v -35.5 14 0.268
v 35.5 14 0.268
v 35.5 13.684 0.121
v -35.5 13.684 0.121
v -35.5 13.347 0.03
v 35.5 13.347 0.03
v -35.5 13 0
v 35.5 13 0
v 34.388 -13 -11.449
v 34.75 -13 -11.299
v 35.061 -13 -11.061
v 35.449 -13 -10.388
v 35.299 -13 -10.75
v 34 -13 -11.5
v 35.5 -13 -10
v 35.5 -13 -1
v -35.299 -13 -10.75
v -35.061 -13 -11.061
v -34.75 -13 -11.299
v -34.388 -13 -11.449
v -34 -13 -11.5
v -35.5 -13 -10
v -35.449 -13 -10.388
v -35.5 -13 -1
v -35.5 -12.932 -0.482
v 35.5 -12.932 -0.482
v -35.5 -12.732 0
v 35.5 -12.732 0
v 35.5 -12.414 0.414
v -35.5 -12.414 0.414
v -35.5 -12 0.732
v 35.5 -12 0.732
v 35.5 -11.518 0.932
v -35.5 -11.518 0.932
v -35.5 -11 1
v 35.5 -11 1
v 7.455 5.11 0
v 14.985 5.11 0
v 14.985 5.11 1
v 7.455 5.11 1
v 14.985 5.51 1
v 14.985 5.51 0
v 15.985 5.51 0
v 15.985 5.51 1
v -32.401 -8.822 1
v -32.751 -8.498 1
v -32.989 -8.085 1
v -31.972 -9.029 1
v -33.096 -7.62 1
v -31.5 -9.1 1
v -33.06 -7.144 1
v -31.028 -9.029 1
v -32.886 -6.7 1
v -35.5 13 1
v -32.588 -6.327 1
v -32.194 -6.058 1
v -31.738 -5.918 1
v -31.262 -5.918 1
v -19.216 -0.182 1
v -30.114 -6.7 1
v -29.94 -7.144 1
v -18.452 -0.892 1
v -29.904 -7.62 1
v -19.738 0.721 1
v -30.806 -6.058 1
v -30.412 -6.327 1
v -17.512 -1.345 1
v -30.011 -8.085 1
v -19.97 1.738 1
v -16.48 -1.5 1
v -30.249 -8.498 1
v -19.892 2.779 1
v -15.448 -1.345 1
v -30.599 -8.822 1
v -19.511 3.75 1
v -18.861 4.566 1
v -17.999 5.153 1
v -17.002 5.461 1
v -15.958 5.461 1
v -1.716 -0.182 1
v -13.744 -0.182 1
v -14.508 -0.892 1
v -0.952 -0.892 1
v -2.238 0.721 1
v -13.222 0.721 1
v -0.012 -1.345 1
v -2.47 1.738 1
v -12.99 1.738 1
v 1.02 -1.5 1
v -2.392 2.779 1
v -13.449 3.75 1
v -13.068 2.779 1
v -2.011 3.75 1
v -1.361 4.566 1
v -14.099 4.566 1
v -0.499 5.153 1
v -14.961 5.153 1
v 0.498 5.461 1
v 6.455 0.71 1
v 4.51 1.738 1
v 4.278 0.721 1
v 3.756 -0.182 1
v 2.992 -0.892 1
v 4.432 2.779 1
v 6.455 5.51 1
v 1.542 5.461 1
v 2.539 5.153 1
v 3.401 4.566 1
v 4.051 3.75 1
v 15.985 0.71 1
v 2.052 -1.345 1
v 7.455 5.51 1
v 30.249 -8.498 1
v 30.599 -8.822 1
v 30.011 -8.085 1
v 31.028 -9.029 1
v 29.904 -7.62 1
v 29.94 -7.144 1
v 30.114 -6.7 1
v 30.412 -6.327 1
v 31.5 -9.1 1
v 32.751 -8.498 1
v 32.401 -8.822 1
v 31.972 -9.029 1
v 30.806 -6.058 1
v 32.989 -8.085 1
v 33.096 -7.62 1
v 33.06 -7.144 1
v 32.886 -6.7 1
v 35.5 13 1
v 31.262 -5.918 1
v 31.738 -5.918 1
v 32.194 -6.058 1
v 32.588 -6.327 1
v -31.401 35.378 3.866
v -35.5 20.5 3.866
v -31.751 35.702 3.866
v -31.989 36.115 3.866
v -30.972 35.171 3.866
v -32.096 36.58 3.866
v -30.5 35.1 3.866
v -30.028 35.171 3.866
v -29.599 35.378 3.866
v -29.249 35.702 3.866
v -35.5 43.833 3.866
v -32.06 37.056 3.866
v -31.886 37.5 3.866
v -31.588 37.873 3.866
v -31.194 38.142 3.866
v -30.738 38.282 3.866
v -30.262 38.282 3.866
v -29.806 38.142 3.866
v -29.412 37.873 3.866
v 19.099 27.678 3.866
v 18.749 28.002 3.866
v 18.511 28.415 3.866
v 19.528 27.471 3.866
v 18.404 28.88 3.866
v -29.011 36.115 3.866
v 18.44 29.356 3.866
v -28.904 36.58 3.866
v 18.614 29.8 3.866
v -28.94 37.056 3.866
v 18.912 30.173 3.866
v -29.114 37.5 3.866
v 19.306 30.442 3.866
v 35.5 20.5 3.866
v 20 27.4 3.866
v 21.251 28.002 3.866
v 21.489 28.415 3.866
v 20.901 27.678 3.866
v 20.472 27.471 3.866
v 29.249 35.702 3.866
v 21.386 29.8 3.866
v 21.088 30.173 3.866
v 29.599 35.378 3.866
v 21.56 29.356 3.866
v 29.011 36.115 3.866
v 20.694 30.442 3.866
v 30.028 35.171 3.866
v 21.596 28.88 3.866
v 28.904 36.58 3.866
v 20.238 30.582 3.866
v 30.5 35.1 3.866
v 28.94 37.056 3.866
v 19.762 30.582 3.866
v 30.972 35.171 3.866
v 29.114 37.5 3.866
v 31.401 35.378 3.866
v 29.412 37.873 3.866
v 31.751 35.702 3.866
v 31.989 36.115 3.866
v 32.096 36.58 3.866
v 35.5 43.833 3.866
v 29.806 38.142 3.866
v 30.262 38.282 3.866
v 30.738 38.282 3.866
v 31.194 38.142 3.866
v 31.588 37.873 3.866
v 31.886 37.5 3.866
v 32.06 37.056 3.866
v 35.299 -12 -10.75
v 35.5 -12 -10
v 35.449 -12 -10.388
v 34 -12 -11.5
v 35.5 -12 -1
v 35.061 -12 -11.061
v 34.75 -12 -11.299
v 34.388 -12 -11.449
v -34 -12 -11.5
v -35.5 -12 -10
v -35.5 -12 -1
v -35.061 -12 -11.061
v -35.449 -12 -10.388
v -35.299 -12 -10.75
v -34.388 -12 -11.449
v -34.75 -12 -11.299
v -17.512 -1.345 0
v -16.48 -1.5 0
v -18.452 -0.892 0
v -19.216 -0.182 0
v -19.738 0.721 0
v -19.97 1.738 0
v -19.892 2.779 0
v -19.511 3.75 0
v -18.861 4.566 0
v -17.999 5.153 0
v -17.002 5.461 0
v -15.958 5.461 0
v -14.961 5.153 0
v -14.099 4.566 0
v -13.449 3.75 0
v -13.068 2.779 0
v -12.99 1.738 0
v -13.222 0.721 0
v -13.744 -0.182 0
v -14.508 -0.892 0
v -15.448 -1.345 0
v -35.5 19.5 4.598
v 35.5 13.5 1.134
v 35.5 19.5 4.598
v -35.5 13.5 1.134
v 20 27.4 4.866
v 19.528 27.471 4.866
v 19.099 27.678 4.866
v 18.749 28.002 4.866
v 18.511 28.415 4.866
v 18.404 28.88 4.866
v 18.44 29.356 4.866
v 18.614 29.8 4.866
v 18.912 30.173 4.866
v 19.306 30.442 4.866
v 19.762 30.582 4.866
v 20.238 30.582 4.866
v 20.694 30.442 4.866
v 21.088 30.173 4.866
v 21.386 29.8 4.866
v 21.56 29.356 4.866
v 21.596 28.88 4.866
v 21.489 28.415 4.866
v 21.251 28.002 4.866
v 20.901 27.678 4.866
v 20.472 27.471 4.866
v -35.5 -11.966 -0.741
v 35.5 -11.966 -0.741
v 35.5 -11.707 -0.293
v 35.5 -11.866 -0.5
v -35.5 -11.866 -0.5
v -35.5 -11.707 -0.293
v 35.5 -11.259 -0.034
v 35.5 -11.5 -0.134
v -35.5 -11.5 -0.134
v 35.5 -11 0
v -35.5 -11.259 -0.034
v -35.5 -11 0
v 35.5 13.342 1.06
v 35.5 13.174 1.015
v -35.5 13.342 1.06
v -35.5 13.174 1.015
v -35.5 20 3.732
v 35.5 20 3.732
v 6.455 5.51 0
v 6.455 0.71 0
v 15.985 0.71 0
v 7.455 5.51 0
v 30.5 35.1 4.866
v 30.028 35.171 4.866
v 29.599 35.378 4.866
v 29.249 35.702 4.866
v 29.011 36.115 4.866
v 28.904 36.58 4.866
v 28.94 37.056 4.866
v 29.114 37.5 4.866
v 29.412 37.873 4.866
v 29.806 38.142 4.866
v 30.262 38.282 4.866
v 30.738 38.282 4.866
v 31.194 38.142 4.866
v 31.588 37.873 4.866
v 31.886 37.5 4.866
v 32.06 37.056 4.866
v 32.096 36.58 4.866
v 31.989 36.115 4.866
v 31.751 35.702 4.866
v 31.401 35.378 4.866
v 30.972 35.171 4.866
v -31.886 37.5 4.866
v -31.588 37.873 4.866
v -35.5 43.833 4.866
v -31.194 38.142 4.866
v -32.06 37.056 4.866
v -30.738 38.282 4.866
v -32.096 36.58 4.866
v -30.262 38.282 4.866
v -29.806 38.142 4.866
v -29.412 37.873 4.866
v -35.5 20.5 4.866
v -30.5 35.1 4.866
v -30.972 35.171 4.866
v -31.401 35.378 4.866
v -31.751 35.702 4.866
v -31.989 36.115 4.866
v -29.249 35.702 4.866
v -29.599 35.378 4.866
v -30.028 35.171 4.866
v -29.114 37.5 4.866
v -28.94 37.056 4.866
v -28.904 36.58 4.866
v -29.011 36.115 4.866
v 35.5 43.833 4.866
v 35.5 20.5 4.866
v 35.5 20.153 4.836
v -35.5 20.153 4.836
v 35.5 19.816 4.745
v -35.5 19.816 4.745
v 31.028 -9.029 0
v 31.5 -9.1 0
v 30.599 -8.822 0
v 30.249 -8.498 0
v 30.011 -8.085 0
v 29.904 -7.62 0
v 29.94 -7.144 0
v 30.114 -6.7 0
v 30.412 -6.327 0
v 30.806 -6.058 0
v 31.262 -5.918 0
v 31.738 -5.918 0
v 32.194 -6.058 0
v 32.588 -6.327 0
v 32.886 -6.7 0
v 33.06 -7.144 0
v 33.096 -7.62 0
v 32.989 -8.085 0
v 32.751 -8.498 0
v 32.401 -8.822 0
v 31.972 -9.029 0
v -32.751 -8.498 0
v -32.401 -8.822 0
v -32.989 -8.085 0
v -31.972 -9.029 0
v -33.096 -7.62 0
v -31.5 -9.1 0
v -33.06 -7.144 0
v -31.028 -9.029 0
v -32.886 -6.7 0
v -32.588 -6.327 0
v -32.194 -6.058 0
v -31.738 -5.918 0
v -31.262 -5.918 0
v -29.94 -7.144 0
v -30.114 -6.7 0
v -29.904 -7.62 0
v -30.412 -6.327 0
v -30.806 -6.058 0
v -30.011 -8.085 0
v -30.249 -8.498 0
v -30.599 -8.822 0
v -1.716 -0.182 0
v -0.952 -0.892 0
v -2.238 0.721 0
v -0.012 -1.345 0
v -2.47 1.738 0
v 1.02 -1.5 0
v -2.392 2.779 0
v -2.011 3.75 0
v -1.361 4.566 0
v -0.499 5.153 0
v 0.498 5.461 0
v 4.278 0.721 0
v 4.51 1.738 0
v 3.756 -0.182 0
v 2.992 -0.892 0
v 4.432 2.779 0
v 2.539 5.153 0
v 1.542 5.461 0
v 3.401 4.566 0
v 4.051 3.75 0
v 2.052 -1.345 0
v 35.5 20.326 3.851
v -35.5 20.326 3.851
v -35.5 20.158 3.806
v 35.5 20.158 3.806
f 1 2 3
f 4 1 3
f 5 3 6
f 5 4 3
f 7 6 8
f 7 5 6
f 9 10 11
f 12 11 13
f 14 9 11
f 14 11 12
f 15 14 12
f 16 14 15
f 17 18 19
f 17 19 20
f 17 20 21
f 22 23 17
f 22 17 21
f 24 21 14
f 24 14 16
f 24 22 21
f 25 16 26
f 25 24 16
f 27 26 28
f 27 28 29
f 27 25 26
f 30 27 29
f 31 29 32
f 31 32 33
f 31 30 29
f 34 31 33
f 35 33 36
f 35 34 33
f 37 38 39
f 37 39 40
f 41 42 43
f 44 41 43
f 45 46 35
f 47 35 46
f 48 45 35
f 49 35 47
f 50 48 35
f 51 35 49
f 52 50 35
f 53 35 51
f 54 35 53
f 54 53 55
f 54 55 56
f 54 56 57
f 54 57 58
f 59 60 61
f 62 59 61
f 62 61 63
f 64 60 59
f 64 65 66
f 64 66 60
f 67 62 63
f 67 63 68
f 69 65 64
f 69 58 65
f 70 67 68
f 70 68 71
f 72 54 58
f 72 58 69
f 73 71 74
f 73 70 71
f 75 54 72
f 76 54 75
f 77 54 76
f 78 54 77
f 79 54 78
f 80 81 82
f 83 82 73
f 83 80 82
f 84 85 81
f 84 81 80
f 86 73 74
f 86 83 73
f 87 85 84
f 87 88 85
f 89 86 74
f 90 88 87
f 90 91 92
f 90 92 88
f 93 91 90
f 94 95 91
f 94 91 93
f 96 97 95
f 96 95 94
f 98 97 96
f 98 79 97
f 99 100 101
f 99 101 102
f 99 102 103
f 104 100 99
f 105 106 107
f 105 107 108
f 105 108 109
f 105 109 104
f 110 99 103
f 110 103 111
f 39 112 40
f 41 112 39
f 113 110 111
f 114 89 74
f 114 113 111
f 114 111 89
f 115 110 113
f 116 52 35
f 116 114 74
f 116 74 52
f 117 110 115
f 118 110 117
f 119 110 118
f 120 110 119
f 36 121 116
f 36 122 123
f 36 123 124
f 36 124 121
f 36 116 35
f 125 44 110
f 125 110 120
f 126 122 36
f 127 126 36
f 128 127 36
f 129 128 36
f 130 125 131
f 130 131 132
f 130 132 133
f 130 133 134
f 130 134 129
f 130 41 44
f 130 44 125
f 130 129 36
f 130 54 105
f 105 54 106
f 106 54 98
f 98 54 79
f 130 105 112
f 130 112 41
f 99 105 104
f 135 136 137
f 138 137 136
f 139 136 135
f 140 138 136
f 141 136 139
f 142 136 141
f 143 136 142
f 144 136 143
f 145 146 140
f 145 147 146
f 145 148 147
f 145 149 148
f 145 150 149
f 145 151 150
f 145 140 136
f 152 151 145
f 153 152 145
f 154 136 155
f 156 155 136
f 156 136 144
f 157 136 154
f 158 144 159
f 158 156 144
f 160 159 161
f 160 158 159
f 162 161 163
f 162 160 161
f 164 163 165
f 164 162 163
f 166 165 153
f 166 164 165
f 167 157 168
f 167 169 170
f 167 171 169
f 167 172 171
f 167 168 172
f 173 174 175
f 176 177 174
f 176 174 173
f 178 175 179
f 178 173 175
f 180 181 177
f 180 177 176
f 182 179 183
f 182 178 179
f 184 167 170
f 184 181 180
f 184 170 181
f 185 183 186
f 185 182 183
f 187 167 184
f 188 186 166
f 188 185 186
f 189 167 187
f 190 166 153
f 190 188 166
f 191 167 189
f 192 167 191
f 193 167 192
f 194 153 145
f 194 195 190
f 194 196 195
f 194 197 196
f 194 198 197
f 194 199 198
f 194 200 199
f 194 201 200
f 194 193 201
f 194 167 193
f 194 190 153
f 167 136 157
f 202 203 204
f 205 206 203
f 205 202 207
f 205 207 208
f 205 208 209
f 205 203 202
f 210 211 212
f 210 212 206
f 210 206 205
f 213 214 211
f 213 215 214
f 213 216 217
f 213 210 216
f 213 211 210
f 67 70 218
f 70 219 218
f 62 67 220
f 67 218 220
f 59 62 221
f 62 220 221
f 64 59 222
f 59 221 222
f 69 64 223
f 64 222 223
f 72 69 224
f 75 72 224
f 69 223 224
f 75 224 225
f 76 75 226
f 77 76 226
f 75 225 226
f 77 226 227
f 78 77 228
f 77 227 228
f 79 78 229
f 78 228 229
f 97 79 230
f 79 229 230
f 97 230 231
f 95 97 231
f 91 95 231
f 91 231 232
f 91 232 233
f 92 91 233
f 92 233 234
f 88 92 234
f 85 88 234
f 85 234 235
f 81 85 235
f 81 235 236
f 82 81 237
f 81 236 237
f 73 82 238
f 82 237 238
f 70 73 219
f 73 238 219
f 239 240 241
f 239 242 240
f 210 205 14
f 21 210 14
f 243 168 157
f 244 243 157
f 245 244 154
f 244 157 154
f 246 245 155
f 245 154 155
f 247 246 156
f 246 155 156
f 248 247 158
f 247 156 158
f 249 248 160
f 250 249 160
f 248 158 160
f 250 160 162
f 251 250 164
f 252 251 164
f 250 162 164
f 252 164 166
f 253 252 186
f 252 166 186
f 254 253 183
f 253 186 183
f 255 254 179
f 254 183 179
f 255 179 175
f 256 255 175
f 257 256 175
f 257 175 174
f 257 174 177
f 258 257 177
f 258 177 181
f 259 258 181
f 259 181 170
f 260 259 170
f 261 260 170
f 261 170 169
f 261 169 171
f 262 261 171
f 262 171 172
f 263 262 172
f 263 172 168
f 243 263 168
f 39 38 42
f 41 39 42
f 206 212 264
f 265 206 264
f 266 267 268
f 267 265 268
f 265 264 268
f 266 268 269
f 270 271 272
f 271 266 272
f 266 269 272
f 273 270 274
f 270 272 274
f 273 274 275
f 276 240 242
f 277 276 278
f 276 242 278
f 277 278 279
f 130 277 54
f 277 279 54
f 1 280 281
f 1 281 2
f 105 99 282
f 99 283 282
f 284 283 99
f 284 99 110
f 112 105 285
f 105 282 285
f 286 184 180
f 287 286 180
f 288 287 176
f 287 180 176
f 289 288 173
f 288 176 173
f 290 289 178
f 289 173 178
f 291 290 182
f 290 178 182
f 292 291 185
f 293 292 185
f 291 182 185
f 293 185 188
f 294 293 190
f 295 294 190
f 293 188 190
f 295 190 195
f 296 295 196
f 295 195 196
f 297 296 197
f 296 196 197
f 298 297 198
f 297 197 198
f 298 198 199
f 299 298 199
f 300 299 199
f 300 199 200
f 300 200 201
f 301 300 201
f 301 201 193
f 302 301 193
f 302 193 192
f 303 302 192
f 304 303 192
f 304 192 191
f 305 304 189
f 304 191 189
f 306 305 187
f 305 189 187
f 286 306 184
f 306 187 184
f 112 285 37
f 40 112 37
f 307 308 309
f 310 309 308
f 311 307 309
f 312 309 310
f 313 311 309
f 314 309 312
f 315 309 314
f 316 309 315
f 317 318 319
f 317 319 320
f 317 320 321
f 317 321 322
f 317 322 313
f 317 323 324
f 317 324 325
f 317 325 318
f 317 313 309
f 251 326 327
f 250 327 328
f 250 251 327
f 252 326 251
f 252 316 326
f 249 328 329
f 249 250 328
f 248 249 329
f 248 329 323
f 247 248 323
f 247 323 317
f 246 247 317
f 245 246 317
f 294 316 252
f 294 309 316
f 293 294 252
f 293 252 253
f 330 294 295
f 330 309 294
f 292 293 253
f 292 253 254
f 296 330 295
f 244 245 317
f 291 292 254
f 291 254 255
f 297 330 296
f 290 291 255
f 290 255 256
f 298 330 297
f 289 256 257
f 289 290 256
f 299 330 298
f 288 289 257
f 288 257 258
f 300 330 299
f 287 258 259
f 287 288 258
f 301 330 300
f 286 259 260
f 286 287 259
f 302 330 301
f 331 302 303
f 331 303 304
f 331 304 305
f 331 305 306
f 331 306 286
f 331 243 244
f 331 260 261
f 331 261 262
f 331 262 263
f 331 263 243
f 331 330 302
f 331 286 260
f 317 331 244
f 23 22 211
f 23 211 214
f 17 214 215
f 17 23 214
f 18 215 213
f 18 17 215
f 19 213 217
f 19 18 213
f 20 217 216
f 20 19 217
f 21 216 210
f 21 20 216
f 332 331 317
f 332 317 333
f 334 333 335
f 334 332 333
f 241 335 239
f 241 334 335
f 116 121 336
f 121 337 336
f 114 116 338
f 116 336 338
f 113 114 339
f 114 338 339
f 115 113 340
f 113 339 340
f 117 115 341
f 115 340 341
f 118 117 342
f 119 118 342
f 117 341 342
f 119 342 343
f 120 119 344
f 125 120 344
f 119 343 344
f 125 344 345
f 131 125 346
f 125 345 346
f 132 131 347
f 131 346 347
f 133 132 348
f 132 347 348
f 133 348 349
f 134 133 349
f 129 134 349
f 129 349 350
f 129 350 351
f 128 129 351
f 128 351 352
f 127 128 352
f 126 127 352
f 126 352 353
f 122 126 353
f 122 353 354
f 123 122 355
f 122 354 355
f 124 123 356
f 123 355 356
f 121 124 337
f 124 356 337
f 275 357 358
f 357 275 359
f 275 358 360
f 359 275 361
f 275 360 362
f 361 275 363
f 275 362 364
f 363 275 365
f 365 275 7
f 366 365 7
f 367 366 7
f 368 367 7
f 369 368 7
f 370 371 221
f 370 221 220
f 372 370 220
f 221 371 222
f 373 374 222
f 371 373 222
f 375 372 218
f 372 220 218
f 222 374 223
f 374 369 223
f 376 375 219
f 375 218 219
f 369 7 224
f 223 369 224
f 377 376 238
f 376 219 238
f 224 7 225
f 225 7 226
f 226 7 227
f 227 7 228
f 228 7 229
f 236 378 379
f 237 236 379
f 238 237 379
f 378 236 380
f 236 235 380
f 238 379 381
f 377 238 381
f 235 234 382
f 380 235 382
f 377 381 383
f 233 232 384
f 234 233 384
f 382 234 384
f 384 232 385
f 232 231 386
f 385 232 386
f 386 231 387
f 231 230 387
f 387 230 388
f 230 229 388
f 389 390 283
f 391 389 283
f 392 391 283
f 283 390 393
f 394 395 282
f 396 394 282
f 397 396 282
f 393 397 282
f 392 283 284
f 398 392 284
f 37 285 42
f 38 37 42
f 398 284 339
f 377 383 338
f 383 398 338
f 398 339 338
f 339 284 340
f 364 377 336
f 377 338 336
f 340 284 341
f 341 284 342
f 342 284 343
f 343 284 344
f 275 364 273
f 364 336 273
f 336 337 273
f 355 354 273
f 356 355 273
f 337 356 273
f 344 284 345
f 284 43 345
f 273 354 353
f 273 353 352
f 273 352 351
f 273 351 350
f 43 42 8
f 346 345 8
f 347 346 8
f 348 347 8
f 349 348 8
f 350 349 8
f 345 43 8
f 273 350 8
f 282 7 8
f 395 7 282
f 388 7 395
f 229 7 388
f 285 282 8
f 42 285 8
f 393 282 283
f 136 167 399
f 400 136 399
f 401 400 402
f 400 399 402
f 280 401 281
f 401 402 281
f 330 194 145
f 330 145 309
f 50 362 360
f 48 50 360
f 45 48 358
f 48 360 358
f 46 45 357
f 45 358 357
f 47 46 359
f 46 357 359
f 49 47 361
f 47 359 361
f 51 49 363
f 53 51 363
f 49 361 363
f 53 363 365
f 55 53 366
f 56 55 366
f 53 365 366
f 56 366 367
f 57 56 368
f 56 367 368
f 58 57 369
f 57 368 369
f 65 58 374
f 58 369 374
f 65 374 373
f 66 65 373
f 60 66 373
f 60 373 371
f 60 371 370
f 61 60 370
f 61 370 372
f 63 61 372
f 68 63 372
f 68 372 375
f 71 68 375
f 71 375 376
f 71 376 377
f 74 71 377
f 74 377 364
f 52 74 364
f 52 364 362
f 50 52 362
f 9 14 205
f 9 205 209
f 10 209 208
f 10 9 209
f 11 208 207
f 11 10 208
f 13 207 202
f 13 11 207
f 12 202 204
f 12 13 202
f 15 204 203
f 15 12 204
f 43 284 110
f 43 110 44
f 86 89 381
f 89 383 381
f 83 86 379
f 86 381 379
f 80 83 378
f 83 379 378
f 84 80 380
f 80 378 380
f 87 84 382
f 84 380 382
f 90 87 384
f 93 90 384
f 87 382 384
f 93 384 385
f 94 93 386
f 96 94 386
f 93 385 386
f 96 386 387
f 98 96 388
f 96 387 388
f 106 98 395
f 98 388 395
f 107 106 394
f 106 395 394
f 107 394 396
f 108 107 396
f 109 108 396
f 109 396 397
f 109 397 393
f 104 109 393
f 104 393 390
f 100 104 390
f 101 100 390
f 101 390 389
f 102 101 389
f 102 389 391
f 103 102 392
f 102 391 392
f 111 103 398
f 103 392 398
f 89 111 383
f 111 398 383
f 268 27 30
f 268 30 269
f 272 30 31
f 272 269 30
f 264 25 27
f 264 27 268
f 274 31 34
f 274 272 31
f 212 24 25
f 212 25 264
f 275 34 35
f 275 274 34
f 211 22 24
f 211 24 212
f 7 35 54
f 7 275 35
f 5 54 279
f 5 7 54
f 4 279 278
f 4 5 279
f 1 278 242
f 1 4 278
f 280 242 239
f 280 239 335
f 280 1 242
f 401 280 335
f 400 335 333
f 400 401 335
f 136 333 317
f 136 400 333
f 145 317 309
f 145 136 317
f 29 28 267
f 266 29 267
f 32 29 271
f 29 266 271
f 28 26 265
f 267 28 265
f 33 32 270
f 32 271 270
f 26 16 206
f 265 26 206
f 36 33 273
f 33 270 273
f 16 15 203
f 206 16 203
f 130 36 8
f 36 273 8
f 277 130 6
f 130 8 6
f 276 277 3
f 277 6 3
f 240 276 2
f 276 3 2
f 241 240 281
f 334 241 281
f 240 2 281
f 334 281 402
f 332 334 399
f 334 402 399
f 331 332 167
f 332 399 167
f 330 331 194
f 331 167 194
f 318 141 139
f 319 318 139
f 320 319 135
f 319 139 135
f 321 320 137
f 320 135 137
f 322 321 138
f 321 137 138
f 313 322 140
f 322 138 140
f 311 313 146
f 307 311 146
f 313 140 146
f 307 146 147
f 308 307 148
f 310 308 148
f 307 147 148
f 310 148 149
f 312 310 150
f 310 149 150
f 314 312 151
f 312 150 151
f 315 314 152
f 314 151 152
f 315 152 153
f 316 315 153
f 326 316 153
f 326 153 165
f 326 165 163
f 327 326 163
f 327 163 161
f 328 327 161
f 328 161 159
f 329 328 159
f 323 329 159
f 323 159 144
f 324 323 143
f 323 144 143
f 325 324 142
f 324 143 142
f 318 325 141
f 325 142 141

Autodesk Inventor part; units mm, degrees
ref_plane "YZ Plane" through (0, 0, 0) normal (1, 0, 0) x (0, 1, 0)
ref_plane "XZ Plane" through (0, 0, 0) normal (0, 1, 0) x (-1, 0, 0)
ref_plane "XY Plane" through (0, 0, 0) normal (0, 0, 1) x (1, 0, 0)
sketch "Sketch1" plane through (0, 0, 0) normal (0, 0, 1) x (1, 0, 0)
  line L0 (0, 18.2) -> (0, -18.2) construction
  line L1 (-49.7, 0) -> (49.7, 0) construction
  line L2 (-35.5, 13) -> (35.5, 13)
  line L3 (35.5, 13) -> (35.5, -13)
  line L4 (35.5, -13) -> (-35.5, -13)
  line L5 (-35.5, -13) -> (-35.5, 13)
  line L6 (-35.5, 13) -> (35.5, -13) construction
  line L7 (35.5, 13) -> (-35.5, -13) construction
  line L8 (14.985, 5.1105) -> (14.985, 5.5105) projected
  line L9 (14.985, 5.1105) -> (7.455, 5.1105) projected
  line L10 (7.455, 5.5105) -> (7.455, 5.1105) projected
  line L11 (6.455, 5.5105) -> (7.455, 5.5105) projected
  line L12 (6.455, 0.7105) -> (6.455, 5.5105) projected
  line L13 (6.455, 0.7105) -> (15.985, 0.7105) projected
  line L14 (15.985, 0.7105) -> (15.985, 5.5105) projected
  line L15 (14.985, 5.5105) -> (15.985, 5.5105) projected
  point P0 (0, 0)
  dimension "d0" = 71
  dimension "d1" = 26
extrude "Plate1" add sketch "Sketch1" along normal blind 1
sketch "Sketch2" plane through (-35.5, 13.5, 1.134) normal (0, 0.5, -0.8660254) x (-1, 0, 0)
  line L0 (-71, 0) -> (0, 0)
  line L1 (0, 0) -> (0, 7.4641)
  line L2 (0, 7.4641) -> (-71, 7.4641)
  line L3 (-71, 7.4641) -> (-71, 0)
edge flange "Flange1" height 8 angle 30 thickness 1 bend radius 1 thickness toward (0, 0.5, -0.8660254) relief tear relief width 1 relief depth 0.5 edges at (0, 13, 1) wall of the first edge with corners at (35.5, 13.5, 1.134) (-35.5, 13.5, 1.134) (-35.5, 19.9641, 4.866) (35.5, 19.9641, 4.866)
bend "Bend1"
corner "Corner1"
sketch "Sketch3" plane through (35.5, 19.9641, 3.866) normal (0, 0, 1) x (1, 0, 0)
  line L0 (-71, 0) -> (0, 0)
  line L1 (0, 0) -> (0, 23.869)
  line L2 (0, 23.869) -> (-71, 23.869)
  line L3 (-71, 23.869) -> (-71, 0)
edge flange "Flange2" height 23.869 angle 30 thickness 1 bend radius 1 thickness toward (0, 0, 1) relief tear relief width 1 relief depth 0.5 edges at (0, 20.4641, 4) wall of the first edge with corners at (-35.5, 19.9641, 3.866) (35.5, 19.9641, 3.866) (35.5, 43.8331, 3.866) (-35.5, 43.8331, 3.866)
bend "Bend2"
corner "Corner2"
sketch "Sketch4" plane through (-35.5, -12, 1) normal (0, -1, 0) x (1, 0, 0)
  line L0 (71, 0) -> (0, 0)
  line L1 (0, 0) -> (0, -12.5)
  line L2 (0, -12.5) -> (71, -12.5)
  line L3 (71, -12.5) -> (71, 0)
edge flange "Flange3" height 12.5 angle 90 thickness 1 bend radius 1 thickness toward (0, -1, 0) relief tear relief width 1 relief depth 0.5 edges at (0, -13, 0) wall of the first edge with corners at (35.5, -12, 1) (-35.5, -12, 1) (-35.5, -12, -11.5) (35.5, -12, -11.5)
bend "Bend3"
corner "Corner3"
fillet "Fillet1" radius 1.5 2 edges at (-35.5, -12.5, -11.5) (35.5, -12.5, -11.5)
sketch "Sketch5" plane through (-35.5, 43.8331, 4.866) normal (0, 0, 1) x (1, 0, 0)
  circle A0 centre (5, -7.1331) radius 1.6 projected
  circle A1 centre (66, -7.1331) radius 1.6 projected
  circle A2 centre (55.5, -14.8331) radius 1.5 projected
  point P0 (35.5, -43.8331)
hole "Hole3" at (-30.5, 36.7, 4.866) at (20, 29, 4.866) at (30.5, 36.7, 4.866) direction (0, 0, -1) diameter 3.2 end through all
sketch "Sketch6" plane through (0, 0, 1) normal (0, 0, 1) x (1, 0, 0)
  circle A0 centre (-16.48, 2) radius 2.286 projected
  circle A1 centre (1.02, 2) radius 2.286 projected
  circle A2 centre (-31.5, -7.5) radius 1.6 projected
  circle A3 centre (31.5, -7.5) radius 1.6 projected
  point P0 (0, 0)
hole "Hole4" at (-31.5, -7.5, 1) at (31.5, -7.5, 1) direction (0, 0, -1) diameter 3.2 end through all
hole "Hole5" at (1.02, 2, 1) at (-16.48, 2, 1) direction (0, 0, -1) diameter 7 end through all
equation "\"d62\" = Thickness"
equation "\"d2\" = Thickness"
equation "\"d3\" = BendReliefWidth"
equation "\"d4\" = BendReliefDepth"
equation "\"d5\" = MinimumRemnant"
equation "\"d6\" = TransitionRadius"
equation "\"d9\" = BendRadius"
equation "\"d10\" = CornerReliefSize"
equation "\"d11\" = GapSize"
equation "\"d12\" = JacobiRadiusSize"
equation "\"d13\" = BendReliefWidth"
equation "\"d14\" = BendReliefDepth"
equation "\"d15\" = MinimumRemnant"
equation "\"d16\" = TransitionRadius"
equation "\"d19\" = BendRadius"
equation "\"d20\" = CornerReliefSize"
equation "\"d21\" = GapSize"
equation "\"d22\" = JacobiRadiusSize"
equation "\"d23\" = BendReliefWidth"
equation "\"d24\" = BendReliefDepth"
equation "\"d25\" = MinimumRemnant"
equation "\"d26\" = TransitionRadius"
equation "\"d29\" = BendRadius"
equation "\"d30\" = CornerReliefSize"
equation "\"d31\" = GapSize"
equation "\"d32\" = JacobiRadiusSize"
equation "\"BendRadius\" = Thickness"
equation "\"BendReliefWidth\" = Thickness"
equation "\"BendReliefDepth\" = 0.5 * Thickness"
equation "\"CornerReliefSize\" = 4 * Thickness"
equation "\"MinimumRemnant\" = 2 * Thickness"
equation "\"TransitionRadius\" = BendRadius"
equation "\"JacobiRadiusSize\" = BendRadius"
equation "\"GapSize\" = Thickness"
equation "\"Thickness\" = 1"
properties part number "Enclosure-Cap"
